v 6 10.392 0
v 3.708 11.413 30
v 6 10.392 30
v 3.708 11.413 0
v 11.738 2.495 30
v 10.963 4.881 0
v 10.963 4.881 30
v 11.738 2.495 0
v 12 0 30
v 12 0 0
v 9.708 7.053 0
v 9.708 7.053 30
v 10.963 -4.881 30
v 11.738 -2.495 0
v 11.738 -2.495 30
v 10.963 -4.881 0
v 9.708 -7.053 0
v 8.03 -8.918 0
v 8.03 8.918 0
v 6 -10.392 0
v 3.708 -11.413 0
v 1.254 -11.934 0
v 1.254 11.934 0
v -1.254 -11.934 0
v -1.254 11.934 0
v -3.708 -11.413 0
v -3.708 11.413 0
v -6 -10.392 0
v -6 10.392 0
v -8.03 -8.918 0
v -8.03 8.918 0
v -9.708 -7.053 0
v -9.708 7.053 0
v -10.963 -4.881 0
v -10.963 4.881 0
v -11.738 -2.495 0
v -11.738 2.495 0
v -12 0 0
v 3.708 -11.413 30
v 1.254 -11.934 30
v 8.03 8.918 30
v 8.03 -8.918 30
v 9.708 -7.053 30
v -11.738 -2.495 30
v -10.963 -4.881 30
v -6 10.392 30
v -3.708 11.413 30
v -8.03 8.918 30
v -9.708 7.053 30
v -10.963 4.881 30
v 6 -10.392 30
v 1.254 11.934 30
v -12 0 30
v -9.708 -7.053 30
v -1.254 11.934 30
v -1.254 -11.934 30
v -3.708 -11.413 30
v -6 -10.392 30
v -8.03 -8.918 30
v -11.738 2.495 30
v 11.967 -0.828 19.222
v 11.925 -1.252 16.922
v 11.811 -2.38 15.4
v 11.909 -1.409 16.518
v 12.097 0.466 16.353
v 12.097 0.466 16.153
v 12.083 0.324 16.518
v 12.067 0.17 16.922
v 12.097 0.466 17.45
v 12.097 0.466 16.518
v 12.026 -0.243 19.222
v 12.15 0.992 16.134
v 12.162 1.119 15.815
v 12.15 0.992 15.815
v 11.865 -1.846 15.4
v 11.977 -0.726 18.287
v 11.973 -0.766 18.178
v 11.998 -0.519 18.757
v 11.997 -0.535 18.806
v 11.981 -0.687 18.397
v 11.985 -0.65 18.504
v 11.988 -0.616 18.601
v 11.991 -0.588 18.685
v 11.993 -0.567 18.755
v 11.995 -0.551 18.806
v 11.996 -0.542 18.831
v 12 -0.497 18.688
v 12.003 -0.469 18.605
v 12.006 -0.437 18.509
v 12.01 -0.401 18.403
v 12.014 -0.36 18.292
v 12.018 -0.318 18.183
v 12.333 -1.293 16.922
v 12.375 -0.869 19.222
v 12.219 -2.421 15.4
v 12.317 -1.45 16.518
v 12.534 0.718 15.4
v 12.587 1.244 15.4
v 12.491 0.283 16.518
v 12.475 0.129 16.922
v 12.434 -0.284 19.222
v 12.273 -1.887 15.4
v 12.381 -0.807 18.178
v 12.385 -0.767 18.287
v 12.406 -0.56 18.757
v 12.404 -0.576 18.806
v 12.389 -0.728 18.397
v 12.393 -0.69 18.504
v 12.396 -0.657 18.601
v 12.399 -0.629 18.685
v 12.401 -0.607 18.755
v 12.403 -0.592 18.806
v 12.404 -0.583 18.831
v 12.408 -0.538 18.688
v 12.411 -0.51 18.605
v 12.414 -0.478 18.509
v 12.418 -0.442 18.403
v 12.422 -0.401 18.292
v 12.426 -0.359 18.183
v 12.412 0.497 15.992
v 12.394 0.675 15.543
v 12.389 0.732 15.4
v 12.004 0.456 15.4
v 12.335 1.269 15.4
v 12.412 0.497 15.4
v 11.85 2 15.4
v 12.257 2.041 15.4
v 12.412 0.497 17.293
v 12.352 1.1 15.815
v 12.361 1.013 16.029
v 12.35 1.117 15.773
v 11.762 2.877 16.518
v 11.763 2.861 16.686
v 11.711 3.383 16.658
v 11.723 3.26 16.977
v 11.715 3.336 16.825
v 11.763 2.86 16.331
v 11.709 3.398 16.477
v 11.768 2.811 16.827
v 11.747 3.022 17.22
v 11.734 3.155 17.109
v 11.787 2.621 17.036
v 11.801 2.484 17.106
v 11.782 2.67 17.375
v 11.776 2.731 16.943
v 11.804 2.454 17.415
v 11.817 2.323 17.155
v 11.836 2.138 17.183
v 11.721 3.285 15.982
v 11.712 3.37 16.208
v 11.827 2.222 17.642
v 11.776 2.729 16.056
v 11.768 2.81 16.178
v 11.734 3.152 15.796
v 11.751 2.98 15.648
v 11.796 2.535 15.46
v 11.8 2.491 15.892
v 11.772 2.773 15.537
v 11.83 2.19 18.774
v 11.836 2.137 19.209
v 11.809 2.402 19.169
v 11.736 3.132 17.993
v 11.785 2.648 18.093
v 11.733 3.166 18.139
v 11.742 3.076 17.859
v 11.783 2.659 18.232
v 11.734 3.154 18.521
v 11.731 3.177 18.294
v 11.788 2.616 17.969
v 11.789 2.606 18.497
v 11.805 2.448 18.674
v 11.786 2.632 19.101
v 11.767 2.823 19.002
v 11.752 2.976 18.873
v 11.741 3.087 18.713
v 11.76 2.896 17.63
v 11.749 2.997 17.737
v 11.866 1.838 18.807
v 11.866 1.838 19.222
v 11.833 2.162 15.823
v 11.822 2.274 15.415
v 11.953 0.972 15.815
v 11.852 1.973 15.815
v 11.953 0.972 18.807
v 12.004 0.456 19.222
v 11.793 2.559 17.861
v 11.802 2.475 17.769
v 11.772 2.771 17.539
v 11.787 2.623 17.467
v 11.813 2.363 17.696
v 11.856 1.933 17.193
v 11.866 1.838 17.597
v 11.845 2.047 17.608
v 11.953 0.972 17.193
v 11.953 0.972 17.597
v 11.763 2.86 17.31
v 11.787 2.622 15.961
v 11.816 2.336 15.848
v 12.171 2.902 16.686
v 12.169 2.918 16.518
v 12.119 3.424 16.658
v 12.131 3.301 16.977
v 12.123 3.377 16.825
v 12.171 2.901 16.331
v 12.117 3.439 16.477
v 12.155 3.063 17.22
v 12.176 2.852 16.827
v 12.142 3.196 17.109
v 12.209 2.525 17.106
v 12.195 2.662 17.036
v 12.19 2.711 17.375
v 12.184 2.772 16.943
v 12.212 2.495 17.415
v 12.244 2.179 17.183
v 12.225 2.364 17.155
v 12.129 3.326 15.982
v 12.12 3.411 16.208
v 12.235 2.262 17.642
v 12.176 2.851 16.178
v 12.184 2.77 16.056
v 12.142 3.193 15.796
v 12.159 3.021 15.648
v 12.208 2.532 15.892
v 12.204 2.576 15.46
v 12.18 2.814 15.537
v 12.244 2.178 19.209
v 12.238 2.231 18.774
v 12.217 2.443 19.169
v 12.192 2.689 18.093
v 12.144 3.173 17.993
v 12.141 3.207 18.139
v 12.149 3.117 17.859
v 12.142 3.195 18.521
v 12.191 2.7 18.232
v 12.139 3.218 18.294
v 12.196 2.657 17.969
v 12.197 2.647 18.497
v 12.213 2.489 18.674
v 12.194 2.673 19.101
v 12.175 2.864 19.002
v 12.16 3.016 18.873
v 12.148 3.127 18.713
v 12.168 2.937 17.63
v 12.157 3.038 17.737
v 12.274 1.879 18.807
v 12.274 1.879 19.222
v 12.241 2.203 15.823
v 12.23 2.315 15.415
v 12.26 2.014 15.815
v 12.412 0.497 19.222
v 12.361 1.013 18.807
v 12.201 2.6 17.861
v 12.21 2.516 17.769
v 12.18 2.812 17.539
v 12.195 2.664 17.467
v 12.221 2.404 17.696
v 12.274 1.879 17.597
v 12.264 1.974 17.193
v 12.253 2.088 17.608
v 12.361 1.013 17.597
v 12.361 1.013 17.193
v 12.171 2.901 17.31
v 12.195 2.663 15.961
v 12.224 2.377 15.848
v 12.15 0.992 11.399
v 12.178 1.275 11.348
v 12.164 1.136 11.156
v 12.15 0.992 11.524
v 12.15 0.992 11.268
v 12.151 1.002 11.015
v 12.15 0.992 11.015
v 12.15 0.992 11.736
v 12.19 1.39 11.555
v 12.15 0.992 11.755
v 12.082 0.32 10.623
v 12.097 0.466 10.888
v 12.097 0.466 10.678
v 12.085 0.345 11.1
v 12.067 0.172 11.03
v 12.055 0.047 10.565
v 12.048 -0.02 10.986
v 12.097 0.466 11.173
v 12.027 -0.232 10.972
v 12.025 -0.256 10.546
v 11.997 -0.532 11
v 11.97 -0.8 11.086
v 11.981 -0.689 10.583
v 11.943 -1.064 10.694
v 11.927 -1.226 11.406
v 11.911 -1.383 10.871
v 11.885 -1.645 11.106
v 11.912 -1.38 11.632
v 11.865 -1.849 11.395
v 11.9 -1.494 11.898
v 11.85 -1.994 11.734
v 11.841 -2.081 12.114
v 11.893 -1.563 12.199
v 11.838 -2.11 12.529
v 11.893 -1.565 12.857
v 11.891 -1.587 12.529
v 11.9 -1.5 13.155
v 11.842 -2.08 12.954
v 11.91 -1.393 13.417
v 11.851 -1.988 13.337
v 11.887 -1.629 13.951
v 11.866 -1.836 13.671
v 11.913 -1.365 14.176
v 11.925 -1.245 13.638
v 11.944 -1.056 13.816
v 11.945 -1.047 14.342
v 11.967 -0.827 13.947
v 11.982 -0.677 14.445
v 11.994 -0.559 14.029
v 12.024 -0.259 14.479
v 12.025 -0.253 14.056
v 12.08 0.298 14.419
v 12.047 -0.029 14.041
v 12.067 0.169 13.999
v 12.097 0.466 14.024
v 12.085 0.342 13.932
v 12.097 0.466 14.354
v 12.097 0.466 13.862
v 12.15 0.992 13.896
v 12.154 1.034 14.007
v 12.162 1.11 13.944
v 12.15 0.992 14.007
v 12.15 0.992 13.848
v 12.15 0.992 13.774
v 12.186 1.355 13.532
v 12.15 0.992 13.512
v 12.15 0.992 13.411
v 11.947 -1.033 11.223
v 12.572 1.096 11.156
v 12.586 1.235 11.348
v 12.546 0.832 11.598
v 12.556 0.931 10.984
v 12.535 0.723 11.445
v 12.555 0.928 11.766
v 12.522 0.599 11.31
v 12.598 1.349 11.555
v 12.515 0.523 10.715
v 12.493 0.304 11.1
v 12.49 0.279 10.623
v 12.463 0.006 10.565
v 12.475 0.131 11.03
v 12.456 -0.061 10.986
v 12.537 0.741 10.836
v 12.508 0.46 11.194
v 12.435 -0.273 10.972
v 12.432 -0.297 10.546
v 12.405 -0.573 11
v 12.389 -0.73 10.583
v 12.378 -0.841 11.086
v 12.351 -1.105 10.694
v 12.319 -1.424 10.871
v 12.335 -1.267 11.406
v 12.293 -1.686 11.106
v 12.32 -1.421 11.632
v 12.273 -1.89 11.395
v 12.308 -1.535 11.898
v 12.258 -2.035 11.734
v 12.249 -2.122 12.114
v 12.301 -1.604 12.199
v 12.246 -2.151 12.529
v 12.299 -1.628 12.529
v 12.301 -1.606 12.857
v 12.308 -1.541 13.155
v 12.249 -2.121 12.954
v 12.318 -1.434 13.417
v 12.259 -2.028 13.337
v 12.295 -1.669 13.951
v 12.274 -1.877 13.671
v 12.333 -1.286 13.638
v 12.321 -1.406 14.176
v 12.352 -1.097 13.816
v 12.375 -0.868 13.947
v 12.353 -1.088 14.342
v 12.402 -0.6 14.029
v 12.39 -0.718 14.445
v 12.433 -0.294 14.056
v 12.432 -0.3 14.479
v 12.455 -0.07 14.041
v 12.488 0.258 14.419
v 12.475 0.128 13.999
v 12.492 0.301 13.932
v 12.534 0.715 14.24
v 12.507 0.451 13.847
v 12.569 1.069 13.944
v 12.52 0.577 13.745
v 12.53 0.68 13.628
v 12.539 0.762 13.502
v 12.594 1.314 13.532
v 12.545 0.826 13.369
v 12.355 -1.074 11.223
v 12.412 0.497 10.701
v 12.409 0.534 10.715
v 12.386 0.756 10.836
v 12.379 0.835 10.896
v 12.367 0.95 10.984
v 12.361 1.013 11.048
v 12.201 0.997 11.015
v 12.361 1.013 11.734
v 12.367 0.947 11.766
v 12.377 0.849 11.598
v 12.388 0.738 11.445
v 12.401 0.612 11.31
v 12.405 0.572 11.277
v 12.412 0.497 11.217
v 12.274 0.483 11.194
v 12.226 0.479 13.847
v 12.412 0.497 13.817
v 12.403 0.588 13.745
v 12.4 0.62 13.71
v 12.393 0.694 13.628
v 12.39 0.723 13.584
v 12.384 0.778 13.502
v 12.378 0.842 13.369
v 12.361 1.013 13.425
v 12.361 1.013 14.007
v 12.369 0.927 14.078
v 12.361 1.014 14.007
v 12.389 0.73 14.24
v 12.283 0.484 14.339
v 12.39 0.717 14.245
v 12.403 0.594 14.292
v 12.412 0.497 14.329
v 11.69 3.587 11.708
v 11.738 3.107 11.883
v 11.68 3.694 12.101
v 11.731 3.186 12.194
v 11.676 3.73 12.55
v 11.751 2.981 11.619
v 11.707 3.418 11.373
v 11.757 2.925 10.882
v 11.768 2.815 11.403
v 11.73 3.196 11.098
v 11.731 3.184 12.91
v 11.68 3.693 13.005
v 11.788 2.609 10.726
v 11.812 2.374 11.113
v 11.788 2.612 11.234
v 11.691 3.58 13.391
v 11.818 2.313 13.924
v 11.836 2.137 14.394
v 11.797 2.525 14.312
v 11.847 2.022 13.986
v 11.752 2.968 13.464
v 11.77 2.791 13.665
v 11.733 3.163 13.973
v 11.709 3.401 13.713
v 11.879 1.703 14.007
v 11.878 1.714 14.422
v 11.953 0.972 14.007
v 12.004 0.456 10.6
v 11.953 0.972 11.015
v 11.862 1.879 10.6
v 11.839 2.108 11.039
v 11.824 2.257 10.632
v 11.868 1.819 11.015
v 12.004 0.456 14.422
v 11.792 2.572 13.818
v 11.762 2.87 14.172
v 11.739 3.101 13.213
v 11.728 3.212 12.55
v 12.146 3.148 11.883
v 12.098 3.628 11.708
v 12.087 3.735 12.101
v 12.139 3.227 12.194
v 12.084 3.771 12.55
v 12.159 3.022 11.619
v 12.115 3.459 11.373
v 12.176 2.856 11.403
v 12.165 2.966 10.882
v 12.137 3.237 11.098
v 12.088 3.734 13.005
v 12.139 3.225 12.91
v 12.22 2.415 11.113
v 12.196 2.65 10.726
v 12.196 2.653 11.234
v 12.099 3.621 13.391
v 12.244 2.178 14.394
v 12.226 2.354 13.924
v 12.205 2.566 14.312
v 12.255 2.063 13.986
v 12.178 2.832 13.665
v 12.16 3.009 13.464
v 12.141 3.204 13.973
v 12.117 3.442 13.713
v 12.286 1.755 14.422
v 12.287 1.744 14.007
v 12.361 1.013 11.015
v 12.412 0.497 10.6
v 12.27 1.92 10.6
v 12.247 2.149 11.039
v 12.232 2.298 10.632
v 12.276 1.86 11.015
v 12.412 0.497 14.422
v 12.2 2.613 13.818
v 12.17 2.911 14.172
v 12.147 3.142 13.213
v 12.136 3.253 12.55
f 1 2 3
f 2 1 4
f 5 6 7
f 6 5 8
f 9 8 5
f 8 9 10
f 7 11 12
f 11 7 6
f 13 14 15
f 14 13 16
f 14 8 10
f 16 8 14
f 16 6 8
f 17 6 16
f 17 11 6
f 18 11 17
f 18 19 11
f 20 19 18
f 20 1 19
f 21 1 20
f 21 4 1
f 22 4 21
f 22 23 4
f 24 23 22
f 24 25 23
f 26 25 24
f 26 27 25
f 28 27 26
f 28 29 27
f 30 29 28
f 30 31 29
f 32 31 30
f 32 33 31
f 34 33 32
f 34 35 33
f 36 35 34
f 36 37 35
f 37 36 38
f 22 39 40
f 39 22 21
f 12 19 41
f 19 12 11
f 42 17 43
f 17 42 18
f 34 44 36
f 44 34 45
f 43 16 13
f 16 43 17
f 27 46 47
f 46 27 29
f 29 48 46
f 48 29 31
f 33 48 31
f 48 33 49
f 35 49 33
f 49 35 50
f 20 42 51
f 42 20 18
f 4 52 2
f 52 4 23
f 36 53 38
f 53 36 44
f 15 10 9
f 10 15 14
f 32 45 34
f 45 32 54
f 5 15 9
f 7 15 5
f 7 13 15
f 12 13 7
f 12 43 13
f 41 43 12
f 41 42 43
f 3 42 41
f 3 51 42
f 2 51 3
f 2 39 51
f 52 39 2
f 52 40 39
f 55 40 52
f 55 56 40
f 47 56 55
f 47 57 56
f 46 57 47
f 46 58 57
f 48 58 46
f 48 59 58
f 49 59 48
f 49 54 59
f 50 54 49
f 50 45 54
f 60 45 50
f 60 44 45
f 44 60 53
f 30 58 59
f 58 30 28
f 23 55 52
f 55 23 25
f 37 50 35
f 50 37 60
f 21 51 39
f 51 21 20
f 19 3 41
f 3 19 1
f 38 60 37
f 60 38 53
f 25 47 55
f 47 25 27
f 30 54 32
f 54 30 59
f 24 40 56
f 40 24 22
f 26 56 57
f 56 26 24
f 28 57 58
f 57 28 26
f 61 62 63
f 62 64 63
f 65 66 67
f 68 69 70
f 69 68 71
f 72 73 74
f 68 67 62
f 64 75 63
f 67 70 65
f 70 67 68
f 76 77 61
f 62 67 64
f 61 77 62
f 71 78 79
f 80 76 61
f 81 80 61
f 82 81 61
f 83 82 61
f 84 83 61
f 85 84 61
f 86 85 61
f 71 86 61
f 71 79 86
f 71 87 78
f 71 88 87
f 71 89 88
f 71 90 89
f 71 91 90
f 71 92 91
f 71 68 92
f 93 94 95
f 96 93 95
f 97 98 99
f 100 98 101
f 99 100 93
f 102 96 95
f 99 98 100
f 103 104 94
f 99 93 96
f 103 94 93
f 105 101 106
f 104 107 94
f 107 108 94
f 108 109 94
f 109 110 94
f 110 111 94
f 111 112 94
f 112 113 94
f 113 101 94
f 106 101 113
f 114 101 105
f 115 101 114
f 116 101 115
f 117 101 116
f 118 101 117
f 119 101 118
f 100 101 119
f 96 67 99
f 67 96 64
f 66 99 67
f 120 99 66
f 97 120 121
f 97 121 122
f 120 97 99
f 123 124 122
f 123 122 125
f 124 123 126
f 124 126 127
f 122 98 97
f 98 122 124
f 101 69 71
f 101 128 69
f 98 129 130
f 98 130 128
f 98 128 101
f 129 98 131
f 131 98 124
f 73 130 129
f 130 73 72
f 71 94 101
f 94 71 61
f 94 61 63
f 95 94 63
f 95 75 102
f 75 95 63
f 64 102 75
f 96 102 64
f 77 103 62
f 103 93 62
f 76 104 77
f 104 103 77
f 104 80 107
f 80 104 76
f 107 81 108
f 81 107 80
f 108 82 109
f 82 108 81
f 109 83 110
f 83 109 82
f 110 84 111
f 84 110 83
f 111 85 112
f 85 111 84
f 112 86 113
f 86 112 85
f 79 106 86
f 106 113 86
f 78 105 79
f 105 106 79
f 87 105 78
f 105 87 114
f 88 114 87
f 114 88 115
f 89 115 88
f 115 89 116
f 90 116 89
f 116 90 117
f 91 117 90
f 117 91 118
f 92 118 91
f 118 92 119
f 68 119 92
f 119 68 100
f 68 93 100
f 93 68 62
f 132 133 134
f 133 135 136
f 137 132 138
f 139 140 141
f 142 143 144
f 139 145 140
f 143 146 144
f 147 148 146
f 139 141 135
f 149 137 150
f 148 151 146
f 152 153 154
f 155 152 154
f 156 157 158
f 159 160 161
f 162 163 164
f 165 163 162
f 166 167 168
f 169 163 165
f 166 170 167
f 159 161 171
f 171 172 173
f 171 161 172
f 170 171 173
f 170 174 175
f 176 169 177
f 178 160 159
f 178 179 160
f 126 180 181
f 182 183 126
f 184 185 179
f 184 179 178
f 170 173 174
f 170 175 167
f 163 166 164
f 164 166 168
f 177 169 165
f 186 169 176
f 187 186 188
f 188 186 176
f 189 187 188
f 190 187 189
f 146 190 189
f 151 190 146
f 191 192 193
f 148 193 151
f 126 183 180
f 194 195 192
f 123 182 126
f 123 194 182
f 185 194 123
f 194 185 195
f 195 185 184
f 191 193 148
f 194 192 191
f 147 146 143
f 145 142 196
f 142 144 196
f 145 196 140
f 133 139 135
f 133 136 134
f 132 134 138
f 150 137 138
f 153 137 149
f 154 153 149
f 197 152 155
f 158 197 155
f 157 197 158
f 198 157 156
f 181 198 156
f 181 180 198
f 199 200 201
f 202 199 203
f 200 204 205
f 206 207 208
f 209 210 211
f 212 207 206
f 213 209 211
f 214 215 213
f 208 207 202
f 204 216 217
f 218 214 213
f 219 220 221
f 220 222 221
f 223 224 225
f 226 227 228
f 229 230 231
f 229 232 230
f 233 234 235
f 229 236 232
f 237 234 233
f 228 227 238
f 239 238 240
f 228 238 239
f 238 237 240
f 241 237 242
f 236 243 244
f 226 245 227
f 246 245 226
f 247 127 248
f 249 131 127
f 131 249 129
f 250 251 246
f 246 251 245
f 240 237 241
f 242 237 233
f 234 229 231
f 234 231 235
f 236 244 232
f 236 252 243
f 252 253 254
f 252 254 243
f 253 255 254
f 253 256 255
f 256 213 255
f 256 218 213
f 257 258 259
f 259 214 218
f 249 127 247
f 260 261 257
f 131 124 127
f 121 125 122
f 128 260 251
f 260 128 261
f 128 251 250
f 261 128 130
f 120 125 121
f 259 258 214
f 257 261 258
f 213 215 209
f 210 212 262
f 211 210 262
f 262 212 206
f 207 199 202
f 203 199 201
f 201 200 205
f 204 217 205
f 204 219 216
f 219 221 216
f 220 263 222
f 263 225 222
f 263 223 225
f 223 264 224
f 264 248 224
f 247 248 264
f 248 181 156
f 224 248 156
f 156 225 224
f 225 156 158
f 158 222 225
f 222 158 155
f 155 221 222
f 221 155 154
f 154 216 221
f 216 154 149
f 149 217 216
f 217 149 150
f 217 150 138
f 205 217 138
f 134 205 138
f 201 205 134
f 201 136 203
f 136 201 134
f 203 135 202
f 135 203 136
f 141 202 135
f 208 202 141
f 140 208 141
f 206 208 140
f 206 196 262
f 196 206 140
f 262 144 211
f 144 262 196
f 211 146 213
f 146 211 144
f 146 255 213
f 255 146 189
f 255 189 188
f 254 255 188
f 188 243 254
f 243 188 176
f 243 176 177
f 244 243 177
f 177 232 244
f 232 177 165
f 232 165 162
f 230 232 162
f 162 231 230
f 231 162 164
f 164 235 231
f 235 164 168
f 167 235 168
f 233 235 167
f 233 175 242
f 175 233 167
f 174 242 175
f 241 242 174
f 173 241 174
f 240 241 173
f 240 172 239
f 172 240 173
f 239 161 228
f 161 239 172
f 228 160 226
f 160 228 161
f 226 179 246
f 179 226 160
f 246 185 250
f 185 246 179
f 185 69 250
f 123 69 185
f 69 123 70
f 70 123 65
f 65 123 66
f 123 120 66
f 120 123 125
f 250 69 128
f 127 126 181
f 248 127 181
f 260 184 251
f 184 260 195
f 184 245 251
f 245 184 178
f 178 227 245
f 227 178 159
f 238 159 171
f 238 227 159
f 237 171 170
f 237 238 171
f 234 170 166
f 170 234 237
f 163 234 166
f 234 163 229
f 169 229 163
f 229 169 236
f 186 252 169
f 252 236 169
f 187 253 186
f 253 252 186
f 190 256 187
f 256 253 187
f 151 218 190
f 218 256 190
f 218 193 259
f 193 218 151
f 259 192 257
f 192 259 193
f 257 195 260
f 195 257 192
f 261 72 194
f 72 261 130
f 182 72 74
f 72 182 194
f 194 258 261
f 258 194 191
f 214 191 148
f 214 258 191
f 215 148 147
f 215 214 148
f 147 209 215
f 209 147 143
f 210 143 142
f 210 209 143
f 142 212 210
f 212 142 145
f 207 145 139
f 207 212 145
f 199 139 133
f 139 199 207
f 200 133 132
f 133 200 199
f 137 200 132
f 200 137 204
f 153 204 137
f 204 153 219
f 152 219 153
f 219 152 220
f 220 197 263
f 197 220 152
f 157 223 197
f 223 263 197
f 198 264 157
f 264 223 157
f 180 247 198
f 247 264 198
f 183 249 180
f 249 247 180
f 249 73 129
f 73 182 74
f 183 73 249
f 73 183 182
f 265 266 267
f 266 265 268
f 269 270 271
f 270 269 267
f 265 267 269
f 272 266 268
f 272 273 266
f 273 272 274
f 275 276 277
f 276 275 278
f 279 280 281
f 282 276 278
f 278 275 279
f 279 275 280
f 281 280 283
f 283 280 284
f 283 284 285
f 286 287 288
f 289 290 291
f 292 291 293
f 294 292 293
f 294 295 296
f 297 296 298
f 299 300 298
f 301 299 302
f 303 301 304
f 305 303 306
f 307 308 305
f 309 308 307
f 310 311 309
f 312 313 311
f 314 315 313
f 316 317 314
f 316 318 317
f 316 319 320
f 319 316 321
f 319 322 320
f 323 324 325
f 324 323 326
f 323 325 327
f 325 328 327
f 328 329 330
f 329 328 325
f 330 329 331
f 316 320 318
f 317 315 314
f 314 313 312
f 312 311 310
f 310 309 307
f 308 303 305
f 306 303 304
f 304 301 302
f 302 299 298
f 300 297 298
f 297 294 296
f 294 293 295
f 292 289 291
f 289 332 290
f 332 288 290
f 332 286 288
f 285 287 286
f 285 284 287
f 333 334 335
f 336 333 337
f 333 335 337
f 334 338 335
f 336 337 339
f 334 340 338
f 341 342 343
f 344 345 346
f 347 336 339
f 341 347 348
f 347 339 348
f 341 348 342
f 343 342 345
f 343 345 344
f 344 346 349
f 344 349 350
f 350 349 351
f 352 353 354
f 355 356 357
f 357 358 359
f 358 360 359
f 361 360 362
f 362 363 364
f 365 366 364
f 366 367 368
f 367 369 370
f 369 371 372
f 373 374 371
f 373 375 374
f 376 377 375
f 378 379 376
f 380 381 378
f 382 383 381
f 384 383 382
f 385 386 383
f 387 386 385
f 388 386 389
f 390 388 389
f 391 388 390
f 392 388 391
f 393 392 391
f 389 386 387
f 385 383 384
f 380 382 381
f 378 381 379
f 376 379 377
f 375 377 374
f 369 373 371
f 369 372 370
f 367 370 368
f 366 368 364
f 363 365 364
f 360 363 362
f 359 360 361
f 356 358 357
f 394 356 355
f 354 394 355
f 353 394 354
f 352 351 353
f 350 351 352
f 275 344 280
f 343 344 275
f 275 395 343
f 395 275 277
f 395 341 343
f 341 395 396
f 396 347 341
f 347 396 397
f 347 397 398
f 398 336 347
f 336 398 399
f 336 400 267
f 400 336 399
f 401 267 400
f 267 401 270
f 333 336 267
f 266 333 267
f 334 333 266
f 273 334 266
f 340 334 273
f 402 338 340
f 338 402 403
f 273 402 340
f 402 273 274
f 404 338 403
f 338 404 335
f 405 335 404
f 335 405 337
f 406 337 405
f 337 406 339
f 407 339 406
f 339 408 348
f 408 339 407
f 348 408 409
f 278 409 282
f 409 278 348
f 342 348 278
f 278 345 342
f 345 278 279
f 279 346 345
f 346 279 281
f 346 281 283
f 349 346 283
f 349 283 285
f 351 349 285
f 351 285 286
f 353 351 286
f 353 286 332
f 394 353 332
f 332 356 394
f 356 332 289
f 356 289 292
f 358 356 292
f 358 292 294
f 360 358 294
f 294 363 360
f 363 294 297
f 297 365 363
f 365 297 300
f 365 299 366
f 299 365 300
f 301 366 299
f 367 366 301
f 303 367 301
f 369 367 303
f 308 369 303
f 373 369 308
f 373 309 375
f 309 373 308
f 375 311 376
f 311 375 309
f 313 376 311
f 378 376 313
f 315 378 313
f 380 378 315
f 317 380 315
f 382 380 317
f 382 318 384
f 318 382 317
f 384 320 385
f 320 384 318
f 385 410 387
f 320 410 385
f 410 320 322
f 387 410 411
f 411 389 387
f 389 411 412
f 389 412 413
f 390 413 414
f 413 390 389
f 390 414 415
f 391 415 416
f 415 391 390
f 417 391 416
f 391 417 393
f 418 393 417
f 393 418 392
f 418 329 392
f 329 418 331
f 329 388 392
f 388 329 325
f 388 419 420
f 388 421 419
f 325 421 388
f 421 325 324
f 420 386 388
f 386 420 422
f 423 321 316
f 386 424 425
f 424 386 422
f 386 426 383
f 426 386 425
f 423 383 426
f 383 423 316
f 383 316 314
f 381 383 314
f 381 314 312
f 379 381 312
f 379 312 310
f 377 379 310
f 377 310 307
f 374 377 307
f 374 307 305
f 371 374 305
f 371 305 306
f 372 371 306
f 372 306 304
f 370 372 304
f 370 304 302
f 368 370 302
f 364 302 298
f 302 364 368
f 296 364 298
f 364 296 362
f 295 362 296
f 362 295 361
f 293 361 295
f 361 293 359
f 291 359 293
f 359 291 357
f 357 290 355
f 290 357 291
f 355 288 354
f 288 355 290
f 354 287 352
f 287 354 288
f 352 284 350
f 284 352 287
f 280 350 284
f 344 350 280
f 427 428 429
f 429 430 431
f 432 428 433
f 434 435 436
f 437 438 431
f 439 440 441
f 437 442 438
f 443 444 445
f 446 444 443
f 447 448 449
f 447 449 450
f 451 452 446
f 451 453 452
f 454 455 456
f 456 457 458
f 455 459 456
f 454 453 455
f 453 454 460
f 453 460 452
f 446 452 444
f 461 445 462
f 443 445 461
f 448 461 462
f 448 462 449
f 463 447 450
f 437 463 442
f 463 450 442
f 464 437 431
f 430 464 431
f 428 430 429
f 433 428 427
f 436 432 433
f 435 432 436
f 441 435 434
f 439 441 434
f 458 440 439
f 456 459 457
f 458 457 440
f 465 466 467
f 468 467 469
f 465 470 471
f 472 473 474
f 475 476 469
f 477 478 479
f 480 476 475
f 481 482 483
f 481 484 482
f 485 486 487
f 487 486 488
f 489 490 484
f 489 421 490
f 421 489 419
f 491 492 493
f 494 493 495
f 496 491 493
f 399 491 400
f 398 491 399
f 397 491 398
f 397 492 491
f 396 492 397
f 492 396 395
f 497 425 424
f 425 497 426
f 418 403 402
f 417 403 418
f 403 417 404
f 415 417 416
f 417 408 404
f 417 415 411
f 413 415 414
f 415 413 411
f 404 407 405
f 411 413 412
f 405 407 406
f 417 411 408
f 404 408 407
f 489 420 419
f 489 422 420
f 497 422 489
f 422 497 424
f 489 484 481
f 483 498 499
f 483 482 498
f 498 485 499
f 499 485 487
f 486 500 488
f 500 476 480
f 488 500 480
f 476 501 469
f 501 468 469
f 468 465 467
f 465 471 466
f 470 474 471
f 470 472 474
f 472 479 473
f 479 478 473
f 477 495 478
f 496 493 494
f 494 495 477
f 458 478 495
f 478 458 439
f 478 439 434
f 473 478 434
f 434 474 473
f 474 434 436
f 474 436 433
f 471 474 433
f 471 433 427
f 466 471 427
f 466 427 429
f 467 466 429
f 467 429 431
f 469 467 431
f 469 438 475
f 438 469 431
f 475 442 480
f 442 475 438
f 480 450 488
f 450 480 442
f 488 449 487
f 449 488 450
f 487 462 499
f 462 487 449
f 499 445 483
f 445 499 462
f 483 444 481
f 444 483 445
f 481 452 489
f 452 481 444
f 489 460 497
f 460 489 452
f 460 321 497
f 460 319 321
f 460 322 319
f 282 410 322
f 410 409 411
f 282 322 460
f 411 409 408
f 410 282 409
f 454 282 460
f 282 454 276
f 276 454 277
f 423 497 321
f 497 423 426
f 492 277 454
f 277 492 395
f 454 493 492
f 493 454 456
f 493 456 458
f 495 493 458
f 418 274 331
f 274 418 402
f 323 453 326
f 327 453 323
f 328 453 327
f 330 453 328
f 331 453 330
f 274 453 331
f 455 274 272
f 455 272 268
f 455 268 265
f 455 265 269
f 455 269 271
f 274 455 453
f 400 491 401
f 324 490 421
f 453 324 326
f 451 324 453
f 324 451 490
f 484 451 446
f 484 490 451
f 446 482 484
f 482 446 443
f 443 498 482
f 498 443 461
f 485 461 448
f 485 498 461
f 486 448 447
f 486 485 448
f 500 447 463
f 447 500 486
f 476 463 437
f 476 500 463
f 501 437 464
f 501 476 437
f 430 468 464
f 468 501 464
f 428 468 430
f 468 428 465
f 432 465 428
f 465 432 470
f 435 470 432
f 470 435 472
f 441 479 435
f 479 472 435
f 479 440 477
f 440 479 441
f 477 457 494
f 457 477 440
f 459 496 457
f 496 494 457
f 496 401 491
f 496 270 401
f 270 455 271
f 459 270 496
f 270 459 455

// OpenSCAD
// Generated by scadwright. Do not hand-edit —
// edit the Python source and regenerate.

union() {
    cylinder(h=30, r=12, center=false);

    translate([11.9301, -1.197, 17.4]) {
        multmatrix([[0.0998334, 0, 0.995004, 0], [0.995004, 0, -0.0998334, 0], [0, 1, 0, 0], [0, 0, 0, 1]]) {
            linear_extrude(height=0.41, center=false) {
                translate([-1.2, -2, 0]) {
                    text("A", size=4);
                }
            }
        }
    }

    translate([11.9301, 1.197, 17.4]) {
        multmatrix([[-0.0998334, 0, 0.995004, 0], [0.995004, 0, 0.0998334, 0], [0, 1, 0, 0], [0, 0, 0, 1]]) {
            linear_extrude(height=0.41, center=false) {
                translate([-1.2, -2, 0]) {
                    text("B", size=4);
                }
            }
        }
    }

    translate([11.9301, -1.197, 12.6]) {
        multmatrix([[0.0998334, 0, 0.995004, 0], [0.995004, 0, -0.0998334, 0], [0, 1, 0, 0], [0, 0, 0, 1]]) {
            linear_extrude(height=0.41, center=false) {
                translate([-1.2, -2, 0]) {
                    text("C", size=4);
                }
            }
        }
    }

    translate([11.9301, 1.197, 12.6]) {
        multmatrix([[-0.0998334, 0, 0.995004, 0], [0.995004, 0, 0.0998334, 0], [0, 1, 0, 0], [0, 0, 0, 1]]) {
            linear_extrude(height=0.41, center=false) {
                translate([-1.2, -2, 0]) {
                    text("D", size=4);
                }
            }
        }
    }
}
